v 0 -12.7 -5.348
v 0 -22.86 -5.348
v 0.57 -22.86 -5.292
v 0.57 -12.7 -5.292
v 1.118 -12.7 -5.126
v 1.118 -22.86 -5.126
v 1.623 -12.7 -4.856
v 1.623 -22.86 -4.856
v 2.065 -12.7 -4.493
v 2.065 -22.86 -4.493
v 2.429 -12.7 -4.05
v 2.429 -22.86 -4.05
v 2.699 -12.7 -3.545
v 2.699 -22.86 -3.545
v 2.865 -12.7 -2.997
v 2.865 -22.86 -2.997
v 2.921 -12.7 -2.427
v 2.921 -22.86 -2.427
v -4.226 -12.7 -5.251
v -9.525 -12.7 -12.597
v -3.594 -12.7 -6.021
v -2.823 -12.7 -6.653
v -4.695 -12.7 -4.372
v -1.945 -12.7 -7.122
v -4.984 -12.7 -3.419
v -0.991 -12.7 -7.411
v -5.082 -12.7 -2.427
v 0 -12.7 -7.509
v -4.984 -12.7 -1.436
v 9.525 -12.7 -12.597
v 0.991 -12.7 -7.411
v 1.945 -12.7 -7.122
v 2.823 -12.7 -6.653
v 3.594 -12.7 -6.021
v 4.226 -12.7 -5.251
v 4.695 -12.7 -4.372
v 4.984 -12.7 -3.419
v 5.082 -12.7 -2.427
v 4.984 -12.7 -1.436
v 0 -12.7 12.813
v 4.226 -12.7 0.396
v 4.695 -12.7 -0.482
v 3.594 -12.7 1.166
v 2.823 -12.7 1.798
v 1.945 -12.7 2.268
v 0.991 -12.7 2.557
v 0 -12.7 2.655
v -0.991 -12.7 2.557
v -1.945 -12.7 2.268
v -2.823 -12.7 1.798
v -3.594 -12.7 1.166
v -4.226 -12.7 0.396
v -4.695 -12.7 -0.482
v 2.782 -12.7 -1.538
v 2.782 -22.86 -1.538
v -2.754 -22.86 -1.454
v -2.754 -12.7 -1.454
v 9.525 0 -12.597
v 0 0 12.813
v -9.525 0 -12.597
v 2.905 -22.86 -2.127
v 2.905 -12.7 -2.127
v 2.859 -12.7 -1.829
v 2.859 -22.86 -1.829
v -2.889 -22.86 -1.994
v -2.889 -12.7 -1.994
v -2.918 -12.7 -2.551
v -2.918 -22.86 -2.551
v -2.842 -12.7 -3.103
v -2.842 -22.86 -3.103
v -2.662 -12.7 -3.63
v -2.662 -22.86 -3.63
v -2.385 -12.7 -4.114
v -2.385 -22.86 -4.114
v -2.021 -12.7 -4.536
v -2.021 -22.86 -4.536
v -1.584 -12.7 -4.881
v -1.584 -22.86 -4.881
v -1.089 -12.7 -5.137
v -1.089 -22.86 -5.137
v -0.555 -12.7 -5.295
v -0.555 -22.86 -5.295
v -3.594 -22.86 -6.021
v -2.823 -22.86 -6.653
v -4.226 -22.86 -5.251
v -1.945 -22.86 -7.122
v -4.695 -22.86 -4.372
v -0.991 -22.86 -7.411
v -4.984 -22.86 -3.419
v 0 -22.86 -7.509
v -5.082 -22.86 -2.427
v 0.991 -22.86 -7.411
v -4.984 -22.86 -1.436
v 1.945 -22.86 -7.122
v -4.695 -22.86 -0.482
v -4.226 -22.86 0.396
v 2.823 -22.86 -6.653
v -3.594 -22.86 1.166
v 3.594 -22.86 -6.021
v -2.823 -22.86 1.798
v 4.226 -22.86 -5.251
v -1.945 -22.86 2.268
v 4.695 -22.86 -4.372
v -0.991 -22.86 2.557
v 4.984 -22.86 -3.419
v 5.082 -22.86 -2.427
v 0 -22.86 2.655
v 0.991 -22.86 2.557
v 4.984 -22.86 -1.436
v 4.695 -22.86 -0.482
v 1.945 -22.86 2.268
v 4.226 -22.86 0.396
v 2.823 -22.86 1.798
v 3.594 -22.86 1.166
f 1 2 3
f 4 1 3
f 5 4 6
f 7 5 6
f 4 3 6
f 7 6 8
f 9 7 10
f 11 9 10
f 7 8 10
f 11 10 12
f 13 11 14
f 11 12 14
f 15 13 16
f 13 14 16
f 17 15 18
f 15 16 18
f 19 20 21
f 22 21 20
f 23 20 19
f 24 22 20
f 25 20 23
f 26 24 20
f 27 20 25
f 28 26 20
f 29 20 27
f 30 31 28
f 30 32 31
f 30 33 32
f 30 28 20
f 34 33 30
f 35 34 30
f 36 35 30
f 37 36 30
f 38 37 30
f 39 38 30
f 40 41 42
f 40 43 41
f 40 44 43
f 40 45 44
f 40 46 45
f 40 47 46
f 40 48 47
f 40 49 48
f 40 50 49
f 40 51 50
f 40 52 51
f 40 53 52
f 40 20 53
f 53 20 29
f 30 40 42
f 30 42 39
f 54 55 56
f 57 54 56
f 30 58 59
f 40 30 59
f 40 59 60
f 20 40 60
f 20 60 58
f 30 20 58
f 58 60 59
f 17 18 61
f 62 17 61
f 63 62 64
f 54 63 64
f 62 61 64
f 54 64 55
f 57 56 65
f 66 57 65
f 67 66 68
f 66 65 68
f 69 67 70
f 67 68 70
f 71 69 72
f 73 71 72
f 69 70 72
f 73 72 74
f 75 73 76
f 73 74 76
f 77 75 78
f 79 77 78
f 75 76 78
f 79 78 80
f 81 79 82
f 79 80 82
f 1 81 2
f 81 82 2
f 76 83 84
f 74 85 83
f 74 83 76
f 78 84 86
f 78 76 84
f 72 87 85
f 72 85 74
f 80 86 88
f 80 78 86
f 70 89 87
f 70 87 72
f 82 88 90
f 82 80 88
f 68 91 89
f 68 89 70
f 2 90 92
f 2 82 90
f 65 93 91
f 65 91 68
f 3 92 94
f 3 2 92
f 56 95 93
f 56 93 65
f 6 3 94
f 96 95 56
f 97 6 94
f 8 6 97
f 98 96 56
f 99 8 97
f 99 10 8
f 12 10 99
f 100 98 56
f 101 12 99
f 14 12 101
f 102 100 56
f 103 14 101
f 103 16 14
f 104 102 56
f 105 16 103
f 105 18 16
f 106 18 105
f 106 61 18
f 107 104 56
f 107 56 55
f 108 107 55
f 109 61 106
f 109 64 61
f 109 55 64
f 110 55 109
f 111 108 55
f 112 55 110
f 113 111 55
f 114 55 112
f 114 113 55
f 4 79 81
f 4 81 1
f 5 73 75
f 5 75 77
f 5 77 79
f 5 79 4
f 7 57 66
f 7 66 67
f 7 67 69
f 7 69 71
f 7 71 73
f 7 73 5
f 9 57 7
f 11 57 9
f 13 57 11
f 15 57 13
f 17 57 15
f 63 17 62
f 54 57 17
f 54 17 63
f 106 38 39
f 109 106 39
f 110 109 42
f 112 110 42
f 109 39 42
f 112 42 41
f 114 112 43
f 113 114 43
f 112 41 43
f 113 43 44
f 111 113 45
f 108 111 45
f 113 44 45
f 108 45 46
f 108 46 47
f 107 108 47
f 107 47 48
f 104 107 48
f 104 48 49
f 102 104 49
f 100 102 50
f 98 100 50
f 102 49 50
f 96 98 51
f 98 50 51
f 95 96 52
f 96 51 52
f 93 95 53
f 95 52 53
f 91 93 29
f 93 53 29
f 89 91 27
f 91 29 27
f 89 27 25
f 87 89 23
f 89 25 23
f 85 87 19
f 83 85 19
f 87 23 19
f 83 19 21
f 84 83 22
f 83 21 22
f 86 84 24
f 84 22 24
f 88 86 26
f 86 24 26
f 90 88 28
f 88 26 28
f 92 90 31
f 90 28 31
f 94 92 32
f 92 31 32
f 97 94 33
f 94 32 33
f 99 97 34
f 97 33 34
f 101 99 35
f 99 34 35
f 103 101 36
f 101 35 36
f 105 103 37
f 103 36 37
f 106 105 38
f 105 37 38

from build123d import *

# Parameters (mm, degrees)
F1_DEPTH = 12.7
F2_R     = 5.08201
F3_DEPTH = 10.16
F5_DEPTH = 10.16


with BuildPart() as f1:
    # F0 (on Front) → F1 (new body)
    with BuildSketch(Plane.XZ):
        Polygon((0, 12.812912), (-9.524995, -12.596868), (9.525005, -12.596868), align=None)
    extrude(amount=F1_DEPTH)

    # F2 (on face) → F3 (join)
    with BuildSketch(Plane.XZ.offset(12.7)):
        with Locations((0, -2.427088)):
            Circle(F2_R)
    extrude(amount=F3_DEPTH)

    # F4 (on face) → F5 (cut)
    with BuildSketch(Plane.XZ.offset(22.86)):
        with BuildLine():
            ThreePointArc((0, -5.348088), (2.065459, -4.492546), (2.921, -2.427088))
            ThreePointArc((2.921, -2.427088), (2.88615, -1.97722), (2.782431, -1.538088))
            Line((2.782431, -1.538088), (-2.754014, -1.453617))
            ThreePointArc((-2.754014, -1.453617), (-2.384927, -4.113612), (0, -5.348088))
        make_face()
    extrude(amount=-F5_DEPTH, mode=Mode.SUBTRACT)


solid = f1.part
